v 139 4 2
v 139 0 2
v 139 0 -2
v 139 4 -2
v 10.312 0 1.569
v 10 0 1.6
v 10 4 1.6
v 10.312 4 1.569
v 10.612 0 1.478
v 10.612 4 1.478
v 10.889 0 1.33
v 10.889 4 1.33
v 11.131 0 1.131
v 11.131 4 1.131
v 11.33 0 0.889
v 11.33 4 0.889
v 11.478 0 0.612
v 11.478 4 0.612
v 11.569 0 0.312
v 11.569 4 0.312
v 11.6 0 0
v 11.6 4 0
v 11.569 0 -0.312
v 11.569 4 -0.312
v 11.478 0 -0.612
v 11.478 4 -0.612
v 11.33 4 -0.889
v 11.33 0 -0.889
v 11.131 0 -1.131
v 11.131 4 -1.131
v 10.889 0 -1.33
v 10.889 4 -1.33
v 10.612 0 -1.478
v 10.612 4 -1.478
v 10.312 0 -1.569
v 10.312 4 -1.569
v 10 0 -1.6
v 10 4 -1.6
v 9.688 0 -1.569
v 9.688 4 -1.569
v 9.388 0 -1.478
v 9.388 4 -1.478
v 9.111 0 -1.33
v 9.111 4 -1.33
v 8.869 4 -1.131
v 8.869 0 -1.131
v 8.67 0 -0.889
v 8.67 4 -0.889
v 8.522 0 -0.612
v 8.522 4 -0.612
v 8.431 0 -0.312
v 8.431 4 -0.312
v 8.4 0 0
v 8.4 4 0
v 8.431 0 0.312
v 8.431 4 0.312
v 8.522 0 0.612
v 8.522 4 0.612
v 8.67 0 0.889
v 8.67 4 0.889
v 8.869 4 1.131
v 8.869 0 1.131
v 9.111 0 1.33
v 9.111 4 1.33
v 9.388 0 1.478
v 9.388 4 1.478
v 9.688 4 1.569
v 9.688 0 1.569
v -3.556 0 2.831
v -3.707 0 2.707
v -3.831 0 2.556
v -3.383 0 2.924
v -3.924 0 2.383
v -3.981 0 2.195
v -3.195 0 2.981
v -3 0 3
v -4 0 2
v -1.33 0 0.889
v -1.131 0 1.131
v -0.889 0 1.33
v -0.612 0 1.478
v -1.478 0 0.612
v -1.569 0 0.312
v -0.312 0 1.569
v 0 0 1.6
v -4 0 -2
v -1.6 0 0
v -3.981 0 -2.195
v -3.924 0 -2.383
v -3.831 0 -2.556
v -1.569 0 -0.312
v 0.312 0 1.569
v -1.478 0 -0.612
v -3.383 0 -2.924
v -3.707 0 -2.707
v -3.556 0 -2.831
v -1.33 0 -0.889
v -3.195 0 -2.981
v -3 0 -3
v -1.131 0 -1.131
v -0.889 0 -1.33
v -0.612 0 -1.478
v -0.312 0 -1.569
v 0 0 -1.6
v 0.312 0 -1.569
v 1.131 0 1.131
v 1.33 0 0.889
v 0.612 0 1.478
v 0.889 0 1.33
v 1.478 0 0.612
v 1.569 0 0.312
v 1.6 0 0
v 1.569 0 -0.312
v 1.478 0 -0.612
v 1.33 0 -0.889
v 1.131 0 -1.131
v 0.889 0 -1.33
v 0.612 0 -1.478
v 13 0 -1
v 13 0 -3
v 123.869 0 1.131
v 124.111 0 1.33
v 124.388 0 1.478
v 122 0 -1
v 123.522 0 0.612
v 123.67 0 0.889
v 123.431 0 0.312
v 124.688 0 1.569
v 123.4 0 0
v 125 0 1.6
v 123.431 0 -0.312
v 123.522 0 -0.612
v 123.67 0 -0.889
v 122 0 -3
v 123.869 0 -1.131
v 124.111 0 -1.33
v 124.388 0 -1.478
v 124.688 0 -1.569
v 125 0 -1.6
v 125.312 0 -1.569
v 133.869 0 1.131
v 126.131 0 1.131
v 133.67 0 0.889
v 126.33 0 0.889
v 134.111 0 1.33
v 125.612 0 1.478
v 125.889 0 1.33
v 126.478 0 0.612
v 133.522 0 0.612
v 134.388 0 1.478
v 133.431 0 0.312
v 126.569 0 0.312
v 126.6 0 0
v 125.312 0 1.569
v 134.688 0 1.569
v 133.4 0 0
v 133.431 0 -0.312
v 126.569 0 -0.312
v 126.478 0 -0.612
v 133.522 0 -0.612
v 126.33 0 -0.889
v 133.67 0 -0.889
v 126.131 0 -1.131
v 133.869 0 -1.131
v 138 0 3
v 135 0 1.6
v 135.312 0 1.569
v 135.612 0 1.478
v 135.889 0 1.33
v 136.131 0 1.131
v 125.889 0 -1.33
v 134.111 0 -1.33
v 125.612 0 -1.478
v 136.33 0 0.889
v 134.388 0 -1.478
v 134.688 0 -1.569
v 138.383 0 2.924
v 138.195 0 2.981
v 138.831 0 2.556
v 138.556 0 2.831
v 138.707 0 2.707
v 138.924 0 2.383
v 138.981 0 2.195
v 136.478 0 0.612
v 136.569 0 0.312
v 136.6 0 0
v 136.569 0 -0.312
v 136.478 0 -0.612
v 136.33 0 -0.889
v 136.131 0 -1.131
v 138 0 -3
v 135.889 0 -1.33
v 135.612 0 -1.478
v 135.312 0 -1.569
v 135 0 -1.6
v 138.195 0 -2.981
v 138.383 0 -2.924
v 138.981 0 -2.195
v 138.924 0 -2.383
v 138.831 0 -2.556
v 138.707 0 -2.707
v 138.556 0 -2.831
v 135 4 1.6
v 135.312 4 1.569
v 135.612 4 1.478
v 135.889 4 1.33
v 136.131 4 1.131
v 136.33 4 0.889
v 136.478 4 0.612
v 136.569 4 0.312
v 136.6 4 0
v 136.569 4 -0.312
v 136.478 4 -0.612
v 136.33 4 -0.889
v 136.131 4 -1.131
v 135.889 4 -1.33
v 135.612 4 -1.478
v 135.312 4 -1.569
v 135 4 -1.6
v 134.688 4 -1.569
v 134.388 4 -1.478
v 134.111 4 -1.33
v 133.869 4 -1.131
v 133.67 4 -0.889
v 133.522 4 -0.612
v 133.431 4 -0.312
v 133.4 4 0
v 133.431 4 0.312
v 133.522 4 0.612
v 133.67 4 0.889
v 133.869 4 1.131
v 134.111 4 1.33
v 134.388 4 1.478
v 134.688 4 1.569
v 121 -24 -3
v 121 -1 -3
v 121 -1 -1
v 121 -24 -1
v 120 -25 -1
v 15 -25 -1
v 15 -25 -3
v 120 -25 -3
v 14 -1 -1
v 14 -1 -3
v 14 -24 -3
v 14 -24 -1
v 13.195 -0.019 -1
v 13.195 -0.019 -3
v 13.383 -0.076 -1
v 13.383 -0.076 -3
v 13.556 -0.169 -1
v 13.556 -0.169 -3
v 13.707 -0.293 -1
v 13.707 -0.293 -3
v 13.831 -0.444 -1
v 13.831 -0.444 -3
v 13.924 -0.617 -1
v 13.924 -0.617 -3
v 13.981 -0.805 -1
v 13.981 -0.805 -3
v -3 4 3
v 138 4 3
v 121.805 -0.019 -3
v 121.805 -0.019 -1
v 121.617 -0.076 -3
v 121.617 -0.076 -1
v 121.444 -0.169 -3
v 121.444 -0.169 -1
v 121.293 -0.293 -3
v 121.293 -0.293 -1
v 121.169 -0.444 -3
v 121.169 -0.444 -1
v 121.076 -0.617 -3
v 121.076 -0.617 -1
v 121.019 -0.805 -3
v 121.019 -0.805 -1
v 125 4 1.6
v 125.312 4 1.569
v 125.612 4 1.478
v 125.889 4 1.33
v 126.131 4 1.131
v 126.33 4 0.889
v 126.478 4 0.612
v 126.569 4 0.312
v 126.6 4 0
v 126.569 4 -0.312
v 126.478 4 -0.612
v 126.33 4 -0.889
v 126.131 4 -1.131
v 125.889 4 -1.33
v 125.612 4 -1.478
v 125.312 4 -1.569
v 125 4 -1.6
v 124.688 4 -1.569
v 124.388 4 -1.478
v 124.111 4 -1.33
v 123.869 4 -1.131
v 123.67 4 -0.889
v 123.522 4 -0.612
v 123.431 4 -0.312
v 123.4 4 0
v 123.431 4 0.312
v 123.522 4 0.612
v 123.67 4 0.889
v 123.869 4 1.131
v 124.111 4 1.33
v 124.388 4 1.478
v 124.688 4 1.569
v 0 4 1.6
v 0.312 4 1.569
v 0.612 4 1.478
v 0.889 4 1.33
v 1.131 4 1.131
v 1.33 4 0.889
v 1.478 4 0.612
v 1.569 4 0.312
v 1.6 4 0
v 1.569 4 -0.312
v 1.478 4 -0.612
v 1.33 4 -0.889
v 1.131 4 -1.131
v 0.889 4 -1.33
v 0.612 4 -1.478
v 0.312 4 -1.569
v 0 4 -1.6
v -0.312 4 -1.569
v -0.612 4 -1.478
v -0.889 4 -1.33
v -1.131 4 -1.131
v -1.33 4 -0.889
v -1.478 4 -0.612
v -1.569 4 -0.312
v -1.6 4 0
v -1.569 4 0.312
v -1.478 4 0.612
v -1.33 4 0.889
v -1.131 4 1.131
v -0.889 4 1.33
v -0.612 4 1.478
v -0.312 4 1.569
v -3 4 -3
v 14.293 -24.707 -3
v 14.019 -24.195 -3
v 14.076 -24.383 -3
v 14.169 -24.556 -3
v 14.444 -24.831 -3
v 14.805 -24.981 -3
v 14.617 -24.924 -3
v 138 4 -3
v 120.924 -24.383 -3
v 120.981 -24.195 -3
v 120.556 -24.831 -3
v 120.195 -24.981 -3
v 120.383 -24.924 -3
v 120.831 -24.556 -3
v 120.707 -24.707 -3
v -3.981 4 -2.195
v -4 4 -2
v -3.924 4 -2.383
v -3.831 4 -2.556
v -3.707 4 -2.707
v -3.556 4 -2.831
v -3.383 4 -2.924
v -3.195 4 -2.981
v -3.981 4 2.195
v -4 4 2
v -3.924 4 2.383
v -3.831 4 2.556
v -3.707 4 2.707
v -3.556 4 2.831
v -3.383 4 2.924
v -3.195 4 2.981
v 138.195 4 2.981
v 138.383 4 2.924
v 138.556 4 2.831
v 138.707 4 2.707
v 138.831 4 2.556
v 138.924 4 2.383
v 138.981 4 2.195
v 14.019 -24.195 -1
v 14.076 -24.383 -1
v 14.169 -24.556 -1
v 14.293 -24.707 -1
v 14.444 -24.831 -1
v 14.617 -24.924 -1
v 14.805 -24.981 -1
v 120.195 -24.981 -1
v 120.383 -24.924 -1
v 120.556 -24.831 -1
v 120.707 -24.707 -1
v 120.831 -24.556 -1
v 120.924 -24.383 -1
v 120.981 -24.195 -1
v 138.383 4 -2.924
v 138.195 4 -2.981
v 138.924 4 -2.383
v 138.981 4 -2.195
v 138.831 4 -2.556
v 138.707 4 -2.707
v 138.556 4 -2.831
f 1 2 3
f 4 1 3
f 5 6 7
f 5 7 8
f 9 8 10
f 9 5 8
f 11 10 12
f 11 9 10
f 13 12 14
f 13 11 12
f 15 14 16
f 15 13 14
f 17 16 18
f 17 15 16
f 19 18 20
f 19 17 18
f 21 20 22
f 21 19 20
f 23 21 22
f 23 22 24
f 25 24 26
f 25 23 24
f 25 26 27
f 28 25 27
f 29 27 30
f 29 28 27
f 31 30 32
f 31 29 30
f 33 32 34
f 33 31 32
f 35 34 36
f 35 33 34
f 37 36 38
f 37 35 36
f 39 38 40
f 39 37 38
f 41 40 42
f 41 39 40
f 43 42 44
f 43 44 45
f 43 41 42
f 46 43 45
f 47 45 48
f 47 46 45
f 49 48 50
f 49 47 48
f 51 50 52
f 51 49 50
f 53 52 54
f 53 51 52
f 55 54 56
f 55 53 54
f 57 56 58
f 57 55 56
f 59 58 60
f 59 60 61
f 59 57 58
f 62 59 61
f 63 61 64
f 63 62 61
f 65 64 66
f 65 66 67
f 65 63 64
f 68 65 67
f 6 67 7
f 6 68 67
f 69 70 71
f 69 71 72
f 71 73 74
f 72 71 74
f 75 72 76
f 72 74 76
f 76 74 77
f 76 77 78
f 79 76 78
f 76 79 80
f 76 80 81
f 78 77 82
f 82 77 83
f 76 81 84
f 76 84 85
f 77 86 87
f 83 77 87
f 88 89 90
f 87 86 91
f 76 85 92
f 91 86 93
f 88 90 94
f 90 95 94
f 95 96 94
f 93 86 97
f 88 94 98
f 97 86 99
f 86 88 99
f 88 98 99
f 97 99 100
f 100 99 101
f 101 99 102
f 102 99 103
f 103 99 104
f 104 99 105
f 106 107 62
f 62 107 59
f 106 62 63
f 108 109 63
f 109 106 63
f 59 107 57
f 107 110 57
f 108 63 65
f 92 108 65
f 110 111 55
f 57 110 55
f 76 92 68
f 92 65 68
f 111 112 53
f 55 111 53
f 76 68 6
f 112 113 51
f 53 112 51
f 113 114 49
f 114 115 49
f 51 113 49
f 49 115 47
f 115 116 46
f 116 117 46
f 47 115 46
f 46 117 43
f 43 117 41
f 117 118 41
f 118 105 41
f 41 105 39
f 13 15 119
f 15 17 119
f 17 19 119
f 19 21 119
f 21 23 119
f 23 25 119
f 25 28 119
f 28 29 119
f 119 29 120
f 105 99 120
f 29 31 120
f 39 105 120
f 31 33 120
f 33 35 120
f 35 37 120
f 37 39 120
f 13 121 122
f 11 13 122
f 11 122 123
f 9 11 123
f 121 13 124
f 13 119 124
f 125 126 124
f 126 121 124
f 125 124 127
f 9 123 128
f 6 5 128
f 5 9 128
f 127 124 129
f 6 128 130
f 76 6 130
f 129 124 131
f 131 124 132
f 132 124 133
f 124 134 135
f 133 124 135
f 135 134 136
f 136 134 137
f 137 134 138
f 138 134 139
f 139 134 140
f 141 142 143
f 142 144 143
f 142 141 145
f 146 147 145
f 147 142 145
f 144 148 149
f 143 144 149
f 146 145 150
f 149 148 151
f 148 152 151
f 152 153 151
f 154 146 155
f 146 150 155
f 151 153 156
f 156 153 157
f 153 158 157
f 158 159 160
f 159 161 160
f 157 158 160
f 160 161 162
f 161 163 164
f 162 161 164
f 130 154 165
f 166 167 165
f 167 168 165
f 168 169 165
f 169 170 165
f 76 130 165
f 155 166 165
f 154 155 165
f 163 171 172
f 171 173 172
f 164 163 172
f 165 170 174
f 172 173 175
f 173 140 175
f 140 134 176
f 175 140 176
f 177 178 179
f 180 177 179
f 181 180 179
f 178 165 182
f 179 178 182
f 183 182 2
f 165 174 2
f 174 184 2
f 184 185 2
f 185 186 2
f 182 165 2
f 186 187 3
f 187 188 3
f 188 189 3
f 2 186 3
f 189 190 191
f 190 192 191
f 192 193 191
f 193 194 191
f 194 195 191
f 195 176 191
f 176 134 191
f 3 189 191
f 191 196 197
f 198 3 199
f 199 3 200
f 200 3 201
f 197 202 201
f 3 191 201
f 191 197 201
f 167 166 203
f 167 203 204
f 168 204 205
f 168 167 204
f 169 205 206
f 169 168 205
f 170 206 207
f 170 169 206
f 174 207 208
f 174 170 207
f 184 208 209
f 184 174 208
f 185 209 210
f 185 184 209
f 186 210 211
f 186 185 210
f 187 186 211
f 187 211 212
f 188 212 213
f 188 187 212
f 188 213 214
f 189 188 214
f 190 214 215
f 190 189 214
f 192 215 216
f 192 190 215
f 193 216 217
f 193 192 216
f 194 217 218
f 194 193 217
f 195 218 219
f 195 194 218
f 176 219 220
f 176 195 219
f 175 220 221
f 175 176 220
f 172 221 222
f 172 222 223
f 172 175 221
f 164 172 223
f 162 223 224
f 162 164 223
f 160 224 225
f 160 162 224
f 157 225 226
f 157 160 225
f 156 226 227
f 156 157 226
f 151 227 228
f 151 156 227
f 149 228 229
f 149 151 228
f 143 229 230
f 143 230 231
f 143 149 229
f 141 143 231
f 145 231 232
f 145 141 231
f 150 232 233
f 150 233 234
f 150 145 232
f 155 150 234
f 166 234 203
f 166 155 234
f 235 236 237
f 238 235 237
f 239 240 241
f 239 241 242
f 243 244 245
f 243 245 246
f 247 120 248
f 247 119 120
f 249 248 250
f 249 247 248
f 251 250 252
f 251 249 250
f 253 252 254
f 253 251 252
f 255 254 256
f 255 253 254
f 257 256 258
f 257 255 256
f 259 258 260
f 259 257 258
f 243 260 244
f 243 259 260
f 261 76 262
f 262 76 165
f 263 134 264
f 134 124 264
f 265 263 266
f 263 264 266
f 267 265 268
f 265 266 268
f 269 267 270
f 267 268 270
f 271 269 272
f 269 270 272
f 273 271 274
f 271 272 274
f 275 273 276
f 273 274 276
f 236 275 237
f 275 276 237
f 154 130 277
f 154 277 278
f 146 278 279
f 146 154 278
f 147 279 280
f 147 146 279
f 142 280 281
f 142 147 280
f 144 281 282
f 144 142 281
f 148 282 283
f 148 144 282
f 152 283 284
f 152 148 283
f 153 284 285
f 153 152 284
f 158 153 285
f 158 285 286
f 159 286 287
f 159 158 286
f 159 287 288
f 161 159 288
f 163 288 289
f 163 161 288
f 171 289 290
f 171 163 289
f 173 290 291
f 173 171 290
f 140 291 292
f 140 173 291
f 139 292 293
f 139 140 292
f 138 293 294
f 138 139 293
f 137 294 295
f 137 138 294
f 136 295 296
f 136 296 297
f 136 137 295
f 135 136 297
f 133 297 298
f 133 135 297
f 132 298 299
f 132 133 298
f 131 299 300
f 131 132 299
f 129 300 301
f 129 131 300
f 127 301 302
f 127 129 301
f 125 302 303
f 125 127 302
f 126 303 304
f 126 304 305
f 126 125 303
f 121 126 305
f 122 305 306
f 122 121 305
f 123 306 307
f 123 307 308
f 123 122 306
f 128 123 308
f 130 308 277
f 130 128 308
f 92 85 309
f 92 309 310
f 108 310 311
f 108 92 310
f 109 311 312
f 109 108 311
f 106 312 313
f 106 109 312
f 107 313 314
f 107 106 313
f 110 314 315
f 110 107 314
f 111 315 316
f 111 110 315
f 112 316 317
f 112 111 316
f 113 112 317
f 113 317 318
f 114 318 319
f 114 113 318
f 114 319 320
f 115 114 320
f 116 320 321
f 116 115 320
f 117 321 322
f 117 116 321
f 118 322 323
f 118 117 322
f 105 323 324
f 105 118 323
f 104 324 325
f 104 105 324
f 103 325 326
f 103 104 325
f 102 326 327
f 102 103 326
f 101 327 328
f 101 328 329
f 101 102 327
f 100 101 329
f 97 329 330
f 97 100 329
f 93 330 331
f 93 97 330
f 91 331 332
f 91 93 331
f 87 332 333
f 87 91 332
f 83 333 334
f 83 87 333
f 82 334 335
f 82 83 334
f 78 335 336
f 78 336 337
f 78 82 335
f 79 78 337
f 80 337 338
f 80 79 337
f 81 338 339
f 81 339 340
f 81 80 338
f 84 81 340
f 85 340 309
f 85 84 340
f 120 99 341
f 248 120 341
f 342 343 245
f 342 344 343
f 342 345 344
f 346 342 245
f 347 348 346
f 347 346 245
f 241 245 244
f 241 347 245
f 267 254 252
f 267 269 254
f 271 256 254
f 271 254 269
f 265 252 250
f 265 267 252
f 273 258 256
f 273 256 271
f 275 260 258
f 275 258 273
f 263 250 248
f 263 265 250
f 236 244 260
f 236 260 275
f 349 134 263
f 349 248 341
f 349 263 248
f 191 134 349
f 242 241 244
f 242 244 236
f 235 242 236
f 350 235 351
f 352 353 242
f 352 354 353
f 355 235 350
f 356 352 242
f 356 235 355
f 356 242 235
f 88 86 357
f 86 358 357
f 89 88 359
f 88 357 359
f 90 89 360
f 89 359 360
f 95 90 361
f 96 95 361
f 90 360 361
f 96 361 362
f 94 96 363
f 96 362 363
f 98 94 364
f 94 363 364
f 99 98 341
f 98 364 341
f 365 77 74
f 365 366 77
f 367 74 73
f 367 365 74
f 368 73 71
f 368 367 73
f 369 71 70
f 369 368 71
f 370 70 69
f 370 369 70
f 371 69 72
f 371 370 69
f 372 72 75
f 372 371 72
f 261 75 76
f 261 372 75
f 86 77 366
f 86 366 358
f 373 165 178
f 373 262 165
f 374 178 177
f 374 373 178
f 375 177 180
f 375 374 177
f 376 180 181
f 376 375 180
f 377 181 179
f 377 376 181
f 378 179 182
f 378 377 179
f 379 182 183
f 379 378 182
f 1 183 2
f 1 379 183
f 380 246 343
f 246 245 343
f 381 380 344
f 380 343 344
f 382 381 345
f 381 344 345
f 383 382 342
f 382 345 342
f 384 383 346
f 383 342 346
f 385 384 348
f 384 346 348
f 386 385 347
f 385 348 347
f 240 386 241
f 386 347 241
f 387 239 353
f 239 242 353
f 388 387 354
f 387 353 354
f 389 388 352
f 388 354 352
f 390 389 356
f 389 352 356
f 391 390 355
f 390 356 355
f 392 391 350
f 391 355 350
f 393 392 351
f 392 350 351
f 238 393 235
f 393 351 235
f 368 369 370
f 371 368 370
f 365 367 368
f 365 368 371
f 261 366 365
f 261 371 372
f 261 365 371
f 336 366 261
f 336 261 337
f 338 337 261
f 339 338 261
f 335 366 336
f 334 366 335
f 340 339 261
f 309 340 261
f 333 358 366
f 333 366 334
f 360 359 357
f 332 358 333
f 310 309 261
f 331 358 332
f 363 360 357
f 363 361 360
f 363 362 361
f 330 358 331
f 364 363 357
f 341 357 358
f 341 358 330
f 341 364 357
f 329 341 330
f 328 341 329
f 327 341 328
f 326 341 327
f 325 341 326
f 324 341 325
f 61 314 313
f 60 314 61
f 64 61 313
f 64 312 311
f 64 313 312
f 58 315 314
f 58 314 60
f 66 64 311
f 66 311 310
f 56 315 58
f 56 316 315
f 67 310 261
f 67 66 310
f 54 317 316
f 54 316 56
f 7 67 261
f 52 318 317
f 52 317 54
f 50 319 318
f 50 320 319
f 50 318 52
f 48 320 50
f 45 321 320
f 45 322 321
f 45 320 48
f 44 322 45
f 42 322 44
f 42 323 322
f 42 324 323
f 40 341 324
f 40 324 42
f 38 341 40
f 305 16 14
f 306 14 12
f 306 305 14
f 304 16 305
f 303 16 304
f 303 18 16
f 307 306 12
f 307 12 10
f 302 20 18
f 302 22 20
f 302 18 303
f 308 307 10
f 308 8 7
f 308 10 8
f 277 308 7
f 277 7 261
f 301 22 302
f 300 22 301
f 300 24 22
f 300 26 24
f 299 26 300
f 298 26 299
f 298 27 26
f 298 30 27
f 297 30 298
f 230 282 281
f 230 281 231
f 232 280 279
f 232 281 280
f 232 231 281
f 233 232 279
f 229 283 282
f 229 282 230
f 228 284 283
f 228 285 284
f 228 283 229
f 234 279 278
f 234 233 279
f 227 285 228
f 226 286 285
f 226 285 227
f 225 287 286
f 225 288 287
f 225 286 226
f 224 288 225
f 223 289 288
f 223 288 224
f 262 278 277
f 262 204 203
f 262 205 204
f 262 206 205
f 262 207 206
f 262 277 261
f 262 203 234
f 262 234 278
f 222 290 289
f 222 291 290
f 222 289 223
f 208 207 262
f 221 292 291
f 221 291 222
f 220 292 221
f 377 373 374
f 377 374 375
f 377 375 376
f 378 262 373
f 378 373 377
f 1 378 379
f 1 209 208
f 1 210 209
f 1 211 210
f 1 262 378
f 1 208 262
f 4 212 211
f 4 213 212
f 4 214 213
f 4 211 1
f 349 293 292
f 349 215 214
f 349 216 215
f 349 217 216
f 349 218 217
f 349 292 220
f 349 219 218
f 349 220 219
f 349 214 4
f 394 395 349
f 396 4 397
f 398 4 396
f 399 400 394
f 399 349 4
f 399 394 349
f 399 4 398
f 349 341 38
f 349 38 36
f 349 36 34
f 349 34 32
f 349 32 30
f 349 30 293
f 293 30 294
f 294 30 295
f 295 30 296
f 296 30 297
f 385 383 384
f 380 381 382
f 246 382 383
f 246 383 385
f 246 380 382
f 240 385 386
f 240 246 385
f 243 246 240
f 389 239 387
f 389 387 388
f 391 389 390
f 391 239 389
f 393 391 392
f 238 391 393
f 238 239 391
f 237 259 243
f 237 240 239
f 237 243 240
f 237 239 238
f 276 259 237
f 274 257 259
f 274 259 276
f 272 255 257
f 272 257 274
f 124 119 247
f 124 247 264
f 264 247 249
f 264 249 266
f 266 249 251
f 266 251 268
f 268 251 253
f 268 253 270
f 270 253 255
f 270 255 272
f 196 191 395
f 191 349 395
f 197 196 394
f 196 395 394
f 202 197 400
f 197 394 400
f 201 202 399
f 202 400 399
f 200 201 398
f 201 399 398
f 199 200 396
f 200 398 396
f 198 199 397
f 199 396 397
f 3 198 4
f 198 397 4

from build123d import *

# Parameters (mm, degrees)
SKETCH_1_W          = 143
SKETCH_1_H          = 6
SKETCH_1_R          = 1.6
EXTRUDE_1_DEPTH     = 4
SKETCH_2_W          = 107
SKETCH_2_H          = 2
EXTRUDE_2_DEPTH     = 40
SKETCH_3_W          = 107
SKETCH_3_H          = 15
CUT_EXTRUDE_1_DEPTH = 145.696233538
FILLET_2_R          = 1


with BuildPart() as part:
    # 草图1 → 凸台-拉伸1 (new body)
    with BuildSketch(Plane(origin=(0, 0, 0), x_dir=(1, 0, 0), z_dir=(0, 1, 0))):
        with Locations((67.5, 0)):
            Rectangle(SKETCH_1_W, SKETCH_1_H)
        with Locations(Location((0, 0, 0), (0, 0, 270))):
            Circle(SKETCH_1_R, mode=Mode.SUBTRACT)
        with Locations(Location((10, 0, 0), (0, 0, 270))):
            Circle(SKETCH_1_R, mode=Mode.SUBTRACT)
        with Locations(Location((125, 0, 0), (0, 0, 270))):
            Circle(SKETCH_1_R, mode=Mode.SUBTRACT)
        with Locations(Location((135, 0, 0), (0, 0, 270))):
            Circle(SKETCH_1_R, mode=Mode.SUBTRACT)
    extrude(amount=EXTRUDE_1_DEPTH)

    # 草图2 → 凸台-拉伸2 (add)
    with BuildSketch(Plane.XZ):
        with Locations((67.5, -2)):
            Rectangle(SKETCH_2_W, SKETCH_2_H)
    extrude(amount=EXTRUDE_2_DEPTH)

    # 草图3 → 切除-拉伸1 (cut, through all)
    with BuildSketch(Plane.XY.offset(-1)):
        with Locations((67.5, -32.5)):
            Rectangle(SKETCH_3_W, SKETCH_3_H)
    extrude(amount=-CUT_EXTRUDE_1_DEPTH, mode=Mode.SUBTRACT)

    # 圆角2
    fillet_2_edges = [part.edges().sort_by_distance(p)[0] for p in [
        (14, 0, -2),
        (121, 0, -2),
        (14, -25, -2),
        (121, -25, -2),
        (-4, 2, -3),
        (139, 2, -3),
        (139, 2, 3),
        (-4, 2, 3),
    ]]
    fillet(fillet_2_edges, radius=FILLET_2_R)


solid = part.part
